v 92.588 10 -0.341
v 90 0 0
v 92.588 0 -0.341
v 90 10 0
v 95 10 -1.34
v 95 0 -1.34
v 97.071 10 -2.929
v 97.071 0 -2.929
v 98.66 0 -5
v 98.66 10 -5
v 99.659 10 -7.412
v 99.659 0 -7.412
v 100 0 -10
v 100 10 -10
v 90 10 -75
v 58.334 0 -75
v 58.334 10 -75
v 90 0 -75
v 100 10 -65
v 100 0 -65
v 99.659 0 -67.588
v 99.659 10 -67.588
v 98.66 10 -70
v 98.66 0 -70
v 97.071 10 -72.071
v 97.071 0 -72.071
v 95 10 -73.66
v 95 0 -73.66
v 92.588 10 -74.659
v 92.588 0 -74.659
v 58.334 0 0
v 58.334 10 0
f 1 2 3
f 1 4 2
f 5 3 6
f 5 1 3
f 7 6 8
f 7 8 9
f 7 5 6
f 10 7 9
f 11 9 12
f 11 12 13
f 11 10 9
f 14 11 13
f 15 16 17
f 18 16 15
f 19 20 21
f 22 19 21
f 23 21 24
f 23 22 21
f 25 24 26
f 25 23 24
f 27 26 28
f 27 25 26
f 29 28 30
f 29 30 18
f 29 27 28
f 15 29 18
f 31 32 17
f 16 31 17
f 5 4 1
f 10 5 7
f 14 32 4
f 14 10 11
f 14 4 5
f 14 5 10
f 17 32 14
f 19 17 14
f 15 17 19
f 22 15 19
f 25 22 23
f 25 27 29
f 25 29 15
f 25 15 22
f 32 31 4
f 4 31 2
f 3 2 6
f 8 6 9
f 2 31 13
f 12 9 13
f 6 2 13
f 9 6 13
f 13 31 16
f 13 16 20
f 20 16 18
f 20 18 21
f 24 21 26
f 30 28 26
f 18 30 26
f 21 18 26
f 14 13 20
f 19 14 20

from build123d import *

# Parameters (mm, degrees)
SKETCH1_W           = 100
SKETCH1_H           = 75
BOSS_EXTRUDE1_DEPTH = 10
FILLET1_R           = 10
SKETCH2_W           = 88.511966946
SKETCH2_H           = 129.218884933
CUT_EXTRUDE1_DEPTH  = 11


with BuildPart() as part:
    # Sketch1 → Boss-Extrude1 (new body)
    with BuildSketch(Plane(origin=(0, 0, 0), x_dir=(1, 0, 0), z_dir=(0, 1, 0))):
        with Locations((50, 37.5)):
            Rectangle(SKETCH1_W, SKETCH1_H)
    extrude(amount=BOSS_EXTRUDE1_DEPTH)

    # Fillet1
    fillet1_edges = [part.edges().sort_by_distance(p)[0] for p in [
        (0, 5, -75),
        (100, 5, -75),
        (100, 5, 0),
        (0, 5, 0),
    ]]
    fillet(fillet1_edges, radius=FILLET1_R)

    # Sketch2 → Cut-Extrude1 (cut, through all)
    with BuildSketch(Plane(origin=(0, 10, 0), x_dir=(1, 0, 0), z_dir=(0, 1, 0))):
        with Locations((14.077953322, 38.537528746)):
            Rectangle(SKETCH2_W, SKETCH2_H)
    extrude(amount=-CUT_EXTRUDE1_DEPTH, mode=Mode.SUBTRACT)


solid = part.part
